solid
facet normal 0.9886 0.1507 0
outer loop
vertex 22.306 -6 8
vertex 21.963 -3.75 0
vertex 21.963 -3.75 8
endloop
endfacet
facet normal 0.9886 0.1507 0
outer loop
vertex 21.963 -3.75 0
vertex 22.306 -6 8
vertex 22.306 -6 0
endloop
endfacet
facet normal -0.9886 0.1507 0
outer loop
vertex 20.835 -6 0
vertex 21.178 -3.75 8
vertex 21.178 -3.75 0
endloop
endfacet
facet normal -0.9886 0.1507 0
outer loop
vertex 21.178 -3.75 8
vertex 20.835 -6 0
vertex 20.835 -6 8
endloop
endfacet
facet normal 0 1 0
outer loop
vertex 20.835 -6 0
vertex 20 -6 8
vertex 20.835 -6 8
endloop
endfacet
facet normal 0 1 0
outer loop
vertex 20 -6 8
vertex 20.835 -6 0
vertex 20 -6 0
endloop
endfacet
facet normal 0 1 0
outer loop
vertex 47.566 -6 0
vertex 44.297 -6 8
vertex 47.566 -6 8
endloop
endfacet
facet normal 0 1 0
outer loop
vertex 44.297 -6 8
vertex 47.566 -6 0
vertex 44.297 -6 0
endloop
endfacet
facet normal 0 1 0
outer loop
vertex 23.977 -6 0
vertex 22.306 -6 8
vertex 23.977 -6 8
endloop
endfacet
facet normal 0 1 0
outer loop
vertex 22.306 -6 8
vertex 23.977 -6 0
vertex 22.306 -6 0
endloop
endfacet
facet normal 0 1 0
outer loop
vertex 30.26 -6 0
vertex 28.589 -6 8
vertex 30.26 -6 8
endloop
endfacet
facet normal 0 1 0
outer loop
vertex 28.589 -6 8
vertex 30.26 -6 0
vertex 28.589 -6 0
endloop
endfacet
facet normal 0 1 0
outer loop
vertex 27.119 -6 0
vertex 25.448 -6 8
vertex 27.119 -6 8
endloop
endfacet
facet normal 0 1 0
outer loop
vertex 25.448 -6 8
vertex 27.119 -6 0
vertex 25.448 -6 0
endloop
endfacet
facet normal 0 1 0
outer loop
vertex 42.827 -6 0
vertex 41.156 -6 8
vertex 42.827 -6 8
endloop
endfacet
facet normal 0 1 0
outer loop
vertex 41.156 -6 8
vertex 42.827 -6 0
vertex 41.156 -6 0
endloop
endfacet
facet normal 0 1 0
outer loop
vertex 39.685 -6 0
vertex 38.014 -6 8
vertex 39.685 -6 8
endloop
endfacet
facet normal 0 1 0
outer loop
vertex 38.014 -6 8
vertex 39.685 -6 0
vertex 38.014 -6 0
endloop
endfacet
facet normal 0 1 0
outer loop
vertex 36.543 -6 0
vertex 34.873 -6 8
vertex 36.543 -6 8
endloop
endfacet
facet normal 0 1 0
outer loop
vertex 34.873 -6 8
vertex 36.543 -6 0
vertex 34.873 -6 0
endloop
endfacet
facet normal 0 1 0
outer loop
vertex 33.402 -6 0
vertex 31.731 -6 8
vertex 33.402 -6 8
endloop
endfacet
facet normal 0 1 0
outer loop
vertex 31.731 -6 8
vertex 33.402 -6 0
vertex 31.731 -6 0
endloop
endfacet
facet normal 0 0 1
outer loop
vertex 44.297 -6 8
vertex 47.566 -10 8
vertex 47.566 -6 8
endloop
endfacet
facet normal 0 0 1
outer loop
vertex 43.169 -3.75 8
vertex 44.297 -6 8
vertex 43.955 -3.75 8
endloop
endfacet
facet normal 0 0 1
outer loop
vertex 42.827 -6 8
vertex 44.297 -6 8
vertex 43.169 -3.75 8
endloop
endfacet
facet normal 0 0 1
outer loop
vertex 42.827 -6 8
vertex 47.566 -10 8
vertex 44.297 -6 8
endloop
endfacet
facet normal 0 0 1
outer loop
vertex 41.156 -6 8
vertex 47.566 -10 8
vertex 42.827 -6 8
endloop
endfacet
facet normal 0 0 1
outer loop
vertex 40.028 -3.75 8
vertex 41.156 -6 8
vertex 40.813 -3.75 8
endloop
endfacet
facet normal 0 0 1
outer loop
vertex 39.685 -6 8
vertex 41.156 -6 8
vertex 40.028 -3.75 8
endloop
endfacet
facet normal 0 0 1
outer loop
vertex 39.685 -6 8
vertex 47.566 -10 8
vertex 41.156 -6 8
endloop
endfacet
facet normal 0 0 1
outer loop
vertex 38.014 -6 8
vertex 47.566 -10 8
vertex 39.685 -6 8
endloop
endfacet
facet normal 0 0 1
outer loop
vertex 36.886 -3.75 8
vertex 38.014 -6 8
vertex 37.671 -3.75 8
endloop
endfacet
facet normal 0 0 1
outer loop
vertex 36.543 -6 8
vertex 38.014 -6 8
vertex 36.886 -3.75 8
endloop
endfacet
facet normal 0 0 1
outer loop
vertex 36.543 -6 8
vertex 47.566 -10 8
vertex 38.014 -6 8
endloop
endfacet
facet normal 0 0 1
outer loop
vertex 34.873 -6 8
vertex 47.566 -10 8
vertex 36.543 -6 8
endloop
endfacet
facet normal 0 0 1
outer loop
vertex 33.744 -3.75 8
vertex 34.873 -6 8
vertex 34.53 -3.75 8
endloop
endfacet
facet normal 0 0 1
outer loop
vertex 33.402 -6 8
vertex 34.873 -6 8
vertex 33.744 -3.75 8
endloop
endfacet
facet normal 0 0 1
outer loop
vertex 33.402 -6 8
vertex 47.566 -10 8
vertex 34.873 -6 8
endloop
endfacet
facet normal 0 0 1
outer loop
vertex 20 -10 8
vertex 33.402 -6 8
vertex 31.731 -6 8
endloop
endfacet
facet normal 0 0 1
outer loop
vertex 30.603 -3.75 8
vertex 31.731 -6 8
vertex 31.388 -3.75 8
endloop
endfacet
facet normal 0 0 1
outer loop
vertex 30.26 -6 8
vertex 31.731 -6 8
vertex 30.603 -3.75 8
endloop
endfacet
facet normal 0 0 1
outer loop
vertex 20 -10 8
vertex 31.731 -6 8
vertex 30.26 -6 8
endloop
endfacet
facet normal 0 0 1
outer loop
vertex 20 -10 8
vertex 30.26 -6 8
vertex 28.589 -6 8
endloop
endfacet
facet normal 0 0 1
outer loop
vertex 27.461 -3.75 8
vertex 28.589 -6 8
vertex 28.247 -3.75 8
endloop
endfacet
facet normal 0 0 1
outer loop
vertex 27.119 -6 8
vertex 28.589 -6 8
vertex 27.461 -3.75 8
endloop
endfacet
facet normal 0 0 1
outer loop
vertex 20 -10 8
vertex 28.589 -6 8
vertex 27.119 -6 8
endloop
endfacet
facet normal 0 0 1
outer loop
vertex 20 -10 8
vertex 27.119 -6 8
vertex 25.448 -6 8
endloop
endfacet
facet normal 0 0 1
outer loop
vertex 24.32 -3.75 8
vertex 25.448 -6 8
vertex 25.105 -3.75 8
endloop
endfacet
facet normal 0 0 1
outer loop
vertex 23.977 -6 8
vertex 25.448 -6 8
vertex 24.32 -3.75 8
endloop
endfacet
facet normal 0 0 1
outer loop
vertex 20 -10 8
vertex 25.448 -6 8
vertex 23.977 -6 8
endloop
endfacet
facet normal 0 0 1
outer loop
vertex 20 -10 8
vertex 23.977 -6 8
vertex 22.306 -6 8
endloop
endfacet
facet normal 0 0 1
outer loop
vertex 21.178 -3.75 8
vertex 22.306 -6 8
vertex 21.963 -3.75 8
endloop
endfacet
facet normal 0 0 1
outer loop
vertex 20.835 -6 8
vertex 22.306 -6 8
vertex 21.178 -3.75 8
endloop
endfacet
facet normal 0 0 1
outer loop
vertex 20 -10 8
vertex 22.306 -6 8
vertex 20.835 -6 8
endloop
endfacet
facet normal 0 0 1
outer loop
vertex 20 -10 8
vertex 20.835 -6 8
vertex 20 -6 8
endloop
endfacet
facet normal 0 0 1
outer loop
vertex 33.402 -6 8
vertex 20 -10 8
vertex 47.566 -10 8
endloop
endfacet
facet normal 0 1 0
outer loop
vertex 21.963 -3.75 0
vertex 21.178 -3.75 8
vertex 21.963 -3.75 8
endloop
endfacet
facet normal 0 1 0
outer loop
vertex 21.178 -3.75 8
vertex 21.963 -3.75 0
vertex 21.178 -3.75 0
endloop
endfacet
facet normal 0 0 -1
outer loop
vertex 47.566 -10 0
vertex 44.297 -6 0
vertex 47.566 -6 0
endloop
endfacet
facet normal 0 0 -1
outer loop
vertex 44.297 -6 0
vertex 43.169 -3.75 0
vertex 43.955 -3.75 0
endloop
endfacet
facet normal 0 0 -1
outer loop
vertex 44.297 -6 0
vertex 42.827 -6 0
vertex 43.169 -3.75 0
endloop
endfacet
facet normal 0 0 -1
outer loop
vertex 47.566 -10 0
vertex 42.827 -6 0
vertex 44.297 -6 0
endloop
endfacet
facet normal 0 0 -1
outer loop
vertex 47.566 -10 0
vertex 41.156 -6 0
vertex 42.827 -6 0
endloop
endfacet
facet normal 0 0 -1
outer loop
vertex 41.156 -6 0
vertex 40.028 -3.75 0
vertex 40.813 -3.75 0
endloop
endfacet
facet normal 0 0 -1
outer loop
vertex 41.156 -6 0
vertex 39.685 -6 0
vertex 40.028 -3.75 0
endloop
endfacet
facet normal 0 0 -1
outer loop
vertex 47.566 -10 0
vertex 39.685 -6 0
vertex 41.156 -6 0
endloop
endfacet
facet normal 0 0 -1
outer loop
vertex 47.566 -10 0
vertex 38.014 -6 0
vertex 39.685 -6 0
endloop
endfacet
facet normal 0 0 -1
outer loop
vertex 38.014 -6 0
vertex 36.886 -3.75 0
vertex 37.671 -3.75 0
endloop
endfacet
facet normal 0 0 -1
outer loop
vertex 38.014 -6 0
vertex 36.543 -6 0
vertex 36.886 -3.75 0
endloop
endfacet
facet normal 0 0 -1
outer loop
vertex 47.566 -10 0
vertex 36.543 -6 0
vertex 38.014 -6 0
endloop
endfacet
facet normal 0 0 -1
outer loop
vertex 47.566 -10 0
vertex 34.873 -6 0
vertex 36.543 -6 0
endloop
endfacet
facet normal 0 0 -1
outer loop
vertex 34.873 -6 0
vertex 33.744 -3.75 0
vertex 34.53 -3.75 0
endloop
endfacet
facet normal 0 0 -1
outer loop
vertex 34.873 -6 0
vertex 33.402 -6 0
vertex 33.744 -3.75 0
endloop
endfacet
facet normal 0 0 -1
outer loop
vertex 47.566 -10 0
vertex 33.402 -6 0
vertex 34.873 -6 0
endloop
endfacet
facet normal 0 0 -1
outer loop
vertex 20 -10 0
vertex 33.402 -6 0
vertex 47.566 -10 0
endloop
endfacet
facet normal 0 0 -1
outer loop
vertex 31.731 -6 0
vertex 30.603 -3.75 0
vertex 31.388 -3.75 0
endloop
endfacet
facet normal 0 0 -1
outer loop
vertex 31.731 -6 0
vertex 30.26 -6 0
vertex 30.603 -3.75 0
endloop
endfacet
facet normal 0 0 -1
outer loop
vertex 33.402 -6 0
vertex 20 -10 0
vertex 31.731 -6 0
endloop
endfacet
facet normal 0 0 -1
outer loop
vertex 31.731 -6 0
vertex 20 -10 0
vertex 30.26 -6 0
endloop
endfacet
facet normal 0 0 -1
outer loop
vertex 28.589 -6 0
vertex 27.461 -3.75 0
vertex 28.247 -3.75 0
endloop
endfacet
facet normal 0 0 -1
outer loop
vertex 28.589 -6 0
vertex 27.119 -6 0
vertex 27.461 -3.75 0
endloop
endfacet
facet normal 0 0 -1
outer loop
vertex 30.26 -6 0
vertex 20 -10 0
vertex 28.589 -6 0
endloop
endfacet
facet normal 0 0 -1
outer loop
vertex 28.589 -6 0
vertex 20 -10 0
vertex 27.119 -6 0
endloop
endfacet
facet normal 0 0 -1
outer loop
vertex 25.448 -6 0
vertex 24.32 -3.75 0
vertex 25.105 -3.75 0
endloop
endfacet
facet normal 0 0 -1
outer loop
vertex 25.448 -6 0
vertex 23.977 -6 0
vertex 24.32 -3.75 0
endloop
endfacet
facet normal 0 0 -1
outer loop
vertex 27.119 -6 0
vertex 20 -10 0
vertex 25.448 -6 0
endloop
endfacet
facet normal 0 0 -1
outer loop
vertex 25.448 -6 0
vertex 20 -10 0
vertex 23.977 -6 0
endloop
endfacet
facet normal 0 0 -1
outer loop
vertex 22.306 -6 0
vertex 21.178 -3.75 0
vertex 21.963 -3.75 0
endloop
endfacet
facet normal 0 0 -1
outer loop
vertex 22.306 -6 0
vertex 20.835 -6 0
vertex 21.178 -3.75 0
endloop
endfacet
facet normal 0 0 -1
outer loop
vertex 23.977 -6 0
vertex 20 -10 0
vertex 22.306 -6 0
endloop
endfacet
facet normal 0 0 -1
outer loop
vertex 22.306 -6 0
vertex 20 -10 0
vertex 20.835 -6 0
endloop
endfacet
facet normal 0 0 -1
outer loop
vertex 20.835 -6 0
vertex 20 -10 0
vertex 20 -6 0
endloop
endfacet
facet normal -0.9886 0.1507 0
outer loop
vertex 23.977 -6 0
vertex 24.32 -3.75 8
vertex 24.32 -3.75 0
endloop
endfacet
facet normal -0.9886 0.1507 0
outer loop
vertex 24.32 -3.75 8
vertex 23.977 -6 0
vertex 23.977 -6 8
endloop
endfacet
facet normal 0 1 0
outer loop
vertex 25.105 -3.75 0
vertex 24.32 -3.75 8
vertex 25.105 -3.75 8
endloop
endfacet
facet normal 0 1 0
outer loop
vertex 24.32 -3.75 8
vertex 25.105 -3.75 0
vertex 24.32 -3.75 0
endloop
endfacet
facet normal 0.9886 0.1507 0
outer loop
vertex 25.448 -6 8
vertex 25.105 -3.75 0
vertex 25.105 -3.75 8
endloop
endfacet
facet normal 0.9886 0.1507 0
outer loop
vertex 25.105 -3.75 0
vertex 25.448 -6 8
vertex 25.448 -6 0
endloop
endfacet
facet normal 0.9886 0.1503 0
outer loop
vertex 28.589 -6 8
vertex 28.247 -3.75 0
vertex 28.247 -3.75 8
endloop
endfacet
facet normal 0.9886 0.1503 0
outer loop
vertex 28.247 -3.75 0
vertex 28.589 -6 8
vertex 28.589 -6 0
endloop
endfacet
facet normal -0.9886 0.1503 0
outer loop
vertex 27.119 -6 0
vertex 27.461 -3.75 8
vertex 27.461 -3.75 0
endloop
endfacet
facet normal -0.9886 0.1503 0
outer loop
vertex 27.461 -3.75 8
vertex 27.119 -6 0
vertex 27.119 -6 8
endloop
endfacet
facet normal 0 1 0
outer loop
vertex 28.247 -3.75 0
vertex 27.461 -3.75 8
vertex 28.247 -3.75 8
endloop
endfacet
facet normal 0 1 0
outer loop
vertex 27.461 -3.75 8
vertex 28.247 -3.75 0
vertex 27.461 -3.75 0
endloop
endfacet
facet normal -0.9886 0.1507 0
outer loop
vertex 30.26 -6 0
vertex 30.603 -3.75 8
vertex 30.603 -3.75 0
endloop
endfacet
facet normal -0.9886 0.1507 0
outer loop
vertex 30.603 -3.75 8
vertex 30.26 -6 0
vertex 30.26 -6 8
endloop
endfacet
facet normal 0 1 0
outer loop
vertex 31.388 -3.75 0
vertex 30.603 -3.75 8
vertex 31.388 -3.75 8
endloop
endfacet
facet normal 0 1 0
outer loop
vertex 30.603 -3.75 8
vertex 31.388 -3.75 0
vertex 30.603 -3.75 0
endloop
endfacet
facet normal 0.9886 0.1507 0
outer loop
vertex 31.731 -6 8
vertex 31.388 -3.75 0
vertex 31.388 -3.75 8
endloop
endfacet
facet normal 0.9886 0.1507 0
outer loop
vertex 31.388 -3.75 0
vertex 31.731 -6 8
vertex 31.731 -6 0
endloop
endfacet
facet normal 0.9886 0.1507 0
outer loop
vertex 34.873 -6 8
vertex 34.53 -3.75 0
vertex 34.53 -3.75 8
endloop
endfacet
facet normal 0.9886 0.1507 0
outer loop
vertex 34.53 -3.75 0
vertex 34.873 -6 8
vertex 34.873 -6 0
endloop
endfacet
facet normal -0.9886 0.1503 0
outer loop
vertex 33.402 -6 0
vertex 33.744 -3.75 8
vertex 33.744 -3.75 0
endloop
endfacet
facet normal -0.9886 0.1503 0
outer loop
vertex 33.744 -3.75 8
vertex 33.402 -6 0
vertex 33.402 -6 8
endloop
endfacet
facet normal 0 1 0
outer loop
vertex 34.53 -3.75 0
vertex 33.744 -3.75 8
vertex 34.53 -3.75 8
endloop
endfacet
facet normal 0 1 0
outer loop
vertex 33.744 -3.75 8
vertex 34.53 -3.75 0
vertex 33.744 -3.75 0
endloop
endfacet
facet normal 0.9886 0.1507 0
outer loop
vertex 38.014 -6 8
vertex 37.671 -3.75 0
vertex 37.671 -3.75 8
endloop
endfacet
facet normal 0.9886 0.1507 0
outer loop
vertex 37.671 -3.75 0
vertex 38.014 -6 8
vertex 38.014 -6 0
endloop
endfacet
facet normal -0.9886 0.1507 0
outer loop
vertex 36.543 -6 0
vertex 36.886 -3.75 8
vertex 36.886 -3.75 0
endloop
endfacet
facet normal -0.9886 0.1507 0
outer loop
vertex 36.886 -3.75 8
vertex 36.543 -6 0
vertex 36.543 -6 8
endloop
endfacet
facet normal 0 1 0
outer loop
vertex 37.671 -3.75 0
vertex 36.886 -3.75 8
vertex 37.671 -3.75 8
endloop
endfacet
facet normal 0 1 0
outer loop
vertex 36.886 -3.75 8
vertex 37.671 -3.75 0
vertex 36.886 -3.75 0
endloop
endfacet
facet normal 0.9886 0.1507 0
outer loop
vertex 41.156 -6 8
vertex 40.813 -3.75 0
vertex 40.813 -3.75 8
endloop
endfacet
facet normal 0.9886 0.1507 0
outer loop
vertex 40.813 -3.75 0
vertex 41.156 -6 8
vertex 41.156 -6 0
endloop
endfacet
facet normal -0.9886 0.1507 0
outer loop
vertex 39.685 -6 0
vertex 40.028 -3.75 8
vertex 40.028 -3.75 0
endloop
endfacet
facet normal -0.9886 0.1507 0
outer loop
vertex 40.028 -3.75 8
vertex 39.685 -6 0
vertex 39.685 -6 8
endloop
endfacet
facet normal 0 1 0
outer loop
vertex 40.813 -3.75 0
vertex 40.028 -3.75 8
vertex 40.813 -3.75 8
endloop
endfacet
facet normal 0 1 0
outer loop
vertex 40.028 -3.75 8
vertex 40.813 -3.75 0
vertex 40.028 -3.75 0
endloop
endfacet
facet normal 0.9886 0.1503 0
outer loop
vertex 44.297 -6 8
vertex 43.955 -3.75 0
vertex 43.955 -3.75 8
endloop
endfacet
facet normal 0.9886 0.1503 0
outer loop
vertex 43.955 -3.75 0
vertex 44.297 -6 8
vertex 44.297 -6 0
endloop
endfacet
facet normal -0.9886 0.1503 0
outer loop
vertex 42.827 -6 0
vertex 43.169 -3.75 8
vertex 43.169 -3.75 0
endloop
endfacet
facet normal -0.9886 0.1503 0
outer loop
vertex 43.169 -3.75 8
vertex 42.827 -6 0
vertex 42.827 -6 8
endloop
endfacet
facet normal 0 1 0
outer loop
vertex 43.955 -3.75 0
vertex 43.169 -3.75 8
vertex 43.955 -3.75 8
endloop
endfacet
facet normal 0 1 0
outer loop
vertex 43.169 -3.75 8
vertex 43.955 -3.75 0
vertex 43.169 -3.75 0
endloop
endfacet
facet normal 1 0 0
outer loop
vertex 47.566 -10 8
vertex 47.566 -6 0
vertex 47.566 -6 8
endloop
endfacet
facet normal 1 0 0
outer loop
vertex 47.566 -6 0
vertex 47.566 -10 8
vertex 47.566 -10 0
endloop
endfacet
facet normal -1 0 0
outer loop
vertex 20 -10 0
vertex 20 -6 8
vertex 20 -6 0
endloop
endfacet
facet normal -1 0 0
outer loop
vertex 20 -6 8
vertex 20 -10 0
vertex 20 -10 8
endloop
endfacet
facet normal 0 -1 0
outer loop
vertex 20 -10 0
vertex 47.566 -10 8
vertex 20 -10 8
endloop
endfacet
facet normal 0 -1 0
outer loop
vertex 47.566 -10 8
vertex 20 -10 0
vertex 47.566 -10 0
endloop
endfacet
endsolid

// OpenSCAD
// ============================================================
// Rack & Pinion — Frein à main KY-040
// Module 1.0 | 8 dents | PLA | Buse 0.4
// ============================================================

m         = 1.0;   // module
N         = 8;     // dents pignon
travel    = 15;    // course linéaire mm
thickness = 8;     // épaisseur engrenages mm

shaft_d   = 6.0;   // axe KY-040 mm
flat_d    = 5.5;   // cote du plat D (mesurer sur votre pièce)

clearance = 0.2;   // jeu impression

// --- Calculs ---
r_pitch = m * N / 2;          // rayon primitif = 4 mm
r_tip   = r_pitch + m;        // rayon de tête  = 5 mm
r_root  = r_pitch - 1.25 * m; // rayon de pied  = 2.75 mm
pitch   = PI * m;             // pas = 3.14 mm
rack_l  = travel + 4 * pitch; // longueur rack avec marges

// ============================================================
// PIGNON
// ============================================================
module tooth_2d() {
    tw_base = pitch / 2 - 0.1;
    tw_tip  = pitch / 4;
    h       = r_tip - r_root;
    polygon([
        [-tw_base/2, 0],
        [ tw_base/2, 0],
        [ tw_tip/2,  h],
        [-tw_tip/2,  h]
    ]);
}

module pinion() {
    difference() {
        // Corps principal
        linear_extrude(thickness)
        difference() {
            circle(r = r_tip, $fn = 64);
            circle(r = r_root, $fn = 64);
            for (i = [0 : N-1])
                rotate([0, 0, i * 360/N])
                    translate([0, r_root])
                        tooth_2d();
        }
        // Alésage axe D
        translate([0, 0, -0.5]) {
            cylinder(d = shaft_d + clearance, h = thickness + 1, $fn = 32);
            translate([flat_d/2, -(shaft_d+1)/2, 0])
                cube([shaft_d, shaft_d + 1, thickness + 1]);
        }
    }
}

// ============================================================
// RACK
// ============================================================
module rack_tooth_2d() {
    tw_base = pitch / 2 - 0.1;
    tw_tip  = pitch / 4;
    h       = 2.25 * m;
    polygon([
        [-tw_base/2, 0],
        [ tw_base/2, 0],
        [ tw_tip/2,  h],
        [-tw_tip/2,  h]
    ]);
}

module rack() {
    n_teeth = floor(rack_l / pitch);
    base_h  = 4;

    union() {
        // Base
        cube([rack_l, base_h, thickness]);
        // Dents
        for (i = [0 : n_teeth - 1])
            translate([i * pitch + pitch/2, base_h, 0])
                linear_extrude(thickness)
                    rack_tooth_2d();
    }
}

// ============================================================
// RENDU — modifier pour exporter séparément
// ============================================================

// Pignon
translate([0, 0, 0])
    pinion();

// Rack (décalé pour visualisation)
translate([20, -10, 0])
    rack();
